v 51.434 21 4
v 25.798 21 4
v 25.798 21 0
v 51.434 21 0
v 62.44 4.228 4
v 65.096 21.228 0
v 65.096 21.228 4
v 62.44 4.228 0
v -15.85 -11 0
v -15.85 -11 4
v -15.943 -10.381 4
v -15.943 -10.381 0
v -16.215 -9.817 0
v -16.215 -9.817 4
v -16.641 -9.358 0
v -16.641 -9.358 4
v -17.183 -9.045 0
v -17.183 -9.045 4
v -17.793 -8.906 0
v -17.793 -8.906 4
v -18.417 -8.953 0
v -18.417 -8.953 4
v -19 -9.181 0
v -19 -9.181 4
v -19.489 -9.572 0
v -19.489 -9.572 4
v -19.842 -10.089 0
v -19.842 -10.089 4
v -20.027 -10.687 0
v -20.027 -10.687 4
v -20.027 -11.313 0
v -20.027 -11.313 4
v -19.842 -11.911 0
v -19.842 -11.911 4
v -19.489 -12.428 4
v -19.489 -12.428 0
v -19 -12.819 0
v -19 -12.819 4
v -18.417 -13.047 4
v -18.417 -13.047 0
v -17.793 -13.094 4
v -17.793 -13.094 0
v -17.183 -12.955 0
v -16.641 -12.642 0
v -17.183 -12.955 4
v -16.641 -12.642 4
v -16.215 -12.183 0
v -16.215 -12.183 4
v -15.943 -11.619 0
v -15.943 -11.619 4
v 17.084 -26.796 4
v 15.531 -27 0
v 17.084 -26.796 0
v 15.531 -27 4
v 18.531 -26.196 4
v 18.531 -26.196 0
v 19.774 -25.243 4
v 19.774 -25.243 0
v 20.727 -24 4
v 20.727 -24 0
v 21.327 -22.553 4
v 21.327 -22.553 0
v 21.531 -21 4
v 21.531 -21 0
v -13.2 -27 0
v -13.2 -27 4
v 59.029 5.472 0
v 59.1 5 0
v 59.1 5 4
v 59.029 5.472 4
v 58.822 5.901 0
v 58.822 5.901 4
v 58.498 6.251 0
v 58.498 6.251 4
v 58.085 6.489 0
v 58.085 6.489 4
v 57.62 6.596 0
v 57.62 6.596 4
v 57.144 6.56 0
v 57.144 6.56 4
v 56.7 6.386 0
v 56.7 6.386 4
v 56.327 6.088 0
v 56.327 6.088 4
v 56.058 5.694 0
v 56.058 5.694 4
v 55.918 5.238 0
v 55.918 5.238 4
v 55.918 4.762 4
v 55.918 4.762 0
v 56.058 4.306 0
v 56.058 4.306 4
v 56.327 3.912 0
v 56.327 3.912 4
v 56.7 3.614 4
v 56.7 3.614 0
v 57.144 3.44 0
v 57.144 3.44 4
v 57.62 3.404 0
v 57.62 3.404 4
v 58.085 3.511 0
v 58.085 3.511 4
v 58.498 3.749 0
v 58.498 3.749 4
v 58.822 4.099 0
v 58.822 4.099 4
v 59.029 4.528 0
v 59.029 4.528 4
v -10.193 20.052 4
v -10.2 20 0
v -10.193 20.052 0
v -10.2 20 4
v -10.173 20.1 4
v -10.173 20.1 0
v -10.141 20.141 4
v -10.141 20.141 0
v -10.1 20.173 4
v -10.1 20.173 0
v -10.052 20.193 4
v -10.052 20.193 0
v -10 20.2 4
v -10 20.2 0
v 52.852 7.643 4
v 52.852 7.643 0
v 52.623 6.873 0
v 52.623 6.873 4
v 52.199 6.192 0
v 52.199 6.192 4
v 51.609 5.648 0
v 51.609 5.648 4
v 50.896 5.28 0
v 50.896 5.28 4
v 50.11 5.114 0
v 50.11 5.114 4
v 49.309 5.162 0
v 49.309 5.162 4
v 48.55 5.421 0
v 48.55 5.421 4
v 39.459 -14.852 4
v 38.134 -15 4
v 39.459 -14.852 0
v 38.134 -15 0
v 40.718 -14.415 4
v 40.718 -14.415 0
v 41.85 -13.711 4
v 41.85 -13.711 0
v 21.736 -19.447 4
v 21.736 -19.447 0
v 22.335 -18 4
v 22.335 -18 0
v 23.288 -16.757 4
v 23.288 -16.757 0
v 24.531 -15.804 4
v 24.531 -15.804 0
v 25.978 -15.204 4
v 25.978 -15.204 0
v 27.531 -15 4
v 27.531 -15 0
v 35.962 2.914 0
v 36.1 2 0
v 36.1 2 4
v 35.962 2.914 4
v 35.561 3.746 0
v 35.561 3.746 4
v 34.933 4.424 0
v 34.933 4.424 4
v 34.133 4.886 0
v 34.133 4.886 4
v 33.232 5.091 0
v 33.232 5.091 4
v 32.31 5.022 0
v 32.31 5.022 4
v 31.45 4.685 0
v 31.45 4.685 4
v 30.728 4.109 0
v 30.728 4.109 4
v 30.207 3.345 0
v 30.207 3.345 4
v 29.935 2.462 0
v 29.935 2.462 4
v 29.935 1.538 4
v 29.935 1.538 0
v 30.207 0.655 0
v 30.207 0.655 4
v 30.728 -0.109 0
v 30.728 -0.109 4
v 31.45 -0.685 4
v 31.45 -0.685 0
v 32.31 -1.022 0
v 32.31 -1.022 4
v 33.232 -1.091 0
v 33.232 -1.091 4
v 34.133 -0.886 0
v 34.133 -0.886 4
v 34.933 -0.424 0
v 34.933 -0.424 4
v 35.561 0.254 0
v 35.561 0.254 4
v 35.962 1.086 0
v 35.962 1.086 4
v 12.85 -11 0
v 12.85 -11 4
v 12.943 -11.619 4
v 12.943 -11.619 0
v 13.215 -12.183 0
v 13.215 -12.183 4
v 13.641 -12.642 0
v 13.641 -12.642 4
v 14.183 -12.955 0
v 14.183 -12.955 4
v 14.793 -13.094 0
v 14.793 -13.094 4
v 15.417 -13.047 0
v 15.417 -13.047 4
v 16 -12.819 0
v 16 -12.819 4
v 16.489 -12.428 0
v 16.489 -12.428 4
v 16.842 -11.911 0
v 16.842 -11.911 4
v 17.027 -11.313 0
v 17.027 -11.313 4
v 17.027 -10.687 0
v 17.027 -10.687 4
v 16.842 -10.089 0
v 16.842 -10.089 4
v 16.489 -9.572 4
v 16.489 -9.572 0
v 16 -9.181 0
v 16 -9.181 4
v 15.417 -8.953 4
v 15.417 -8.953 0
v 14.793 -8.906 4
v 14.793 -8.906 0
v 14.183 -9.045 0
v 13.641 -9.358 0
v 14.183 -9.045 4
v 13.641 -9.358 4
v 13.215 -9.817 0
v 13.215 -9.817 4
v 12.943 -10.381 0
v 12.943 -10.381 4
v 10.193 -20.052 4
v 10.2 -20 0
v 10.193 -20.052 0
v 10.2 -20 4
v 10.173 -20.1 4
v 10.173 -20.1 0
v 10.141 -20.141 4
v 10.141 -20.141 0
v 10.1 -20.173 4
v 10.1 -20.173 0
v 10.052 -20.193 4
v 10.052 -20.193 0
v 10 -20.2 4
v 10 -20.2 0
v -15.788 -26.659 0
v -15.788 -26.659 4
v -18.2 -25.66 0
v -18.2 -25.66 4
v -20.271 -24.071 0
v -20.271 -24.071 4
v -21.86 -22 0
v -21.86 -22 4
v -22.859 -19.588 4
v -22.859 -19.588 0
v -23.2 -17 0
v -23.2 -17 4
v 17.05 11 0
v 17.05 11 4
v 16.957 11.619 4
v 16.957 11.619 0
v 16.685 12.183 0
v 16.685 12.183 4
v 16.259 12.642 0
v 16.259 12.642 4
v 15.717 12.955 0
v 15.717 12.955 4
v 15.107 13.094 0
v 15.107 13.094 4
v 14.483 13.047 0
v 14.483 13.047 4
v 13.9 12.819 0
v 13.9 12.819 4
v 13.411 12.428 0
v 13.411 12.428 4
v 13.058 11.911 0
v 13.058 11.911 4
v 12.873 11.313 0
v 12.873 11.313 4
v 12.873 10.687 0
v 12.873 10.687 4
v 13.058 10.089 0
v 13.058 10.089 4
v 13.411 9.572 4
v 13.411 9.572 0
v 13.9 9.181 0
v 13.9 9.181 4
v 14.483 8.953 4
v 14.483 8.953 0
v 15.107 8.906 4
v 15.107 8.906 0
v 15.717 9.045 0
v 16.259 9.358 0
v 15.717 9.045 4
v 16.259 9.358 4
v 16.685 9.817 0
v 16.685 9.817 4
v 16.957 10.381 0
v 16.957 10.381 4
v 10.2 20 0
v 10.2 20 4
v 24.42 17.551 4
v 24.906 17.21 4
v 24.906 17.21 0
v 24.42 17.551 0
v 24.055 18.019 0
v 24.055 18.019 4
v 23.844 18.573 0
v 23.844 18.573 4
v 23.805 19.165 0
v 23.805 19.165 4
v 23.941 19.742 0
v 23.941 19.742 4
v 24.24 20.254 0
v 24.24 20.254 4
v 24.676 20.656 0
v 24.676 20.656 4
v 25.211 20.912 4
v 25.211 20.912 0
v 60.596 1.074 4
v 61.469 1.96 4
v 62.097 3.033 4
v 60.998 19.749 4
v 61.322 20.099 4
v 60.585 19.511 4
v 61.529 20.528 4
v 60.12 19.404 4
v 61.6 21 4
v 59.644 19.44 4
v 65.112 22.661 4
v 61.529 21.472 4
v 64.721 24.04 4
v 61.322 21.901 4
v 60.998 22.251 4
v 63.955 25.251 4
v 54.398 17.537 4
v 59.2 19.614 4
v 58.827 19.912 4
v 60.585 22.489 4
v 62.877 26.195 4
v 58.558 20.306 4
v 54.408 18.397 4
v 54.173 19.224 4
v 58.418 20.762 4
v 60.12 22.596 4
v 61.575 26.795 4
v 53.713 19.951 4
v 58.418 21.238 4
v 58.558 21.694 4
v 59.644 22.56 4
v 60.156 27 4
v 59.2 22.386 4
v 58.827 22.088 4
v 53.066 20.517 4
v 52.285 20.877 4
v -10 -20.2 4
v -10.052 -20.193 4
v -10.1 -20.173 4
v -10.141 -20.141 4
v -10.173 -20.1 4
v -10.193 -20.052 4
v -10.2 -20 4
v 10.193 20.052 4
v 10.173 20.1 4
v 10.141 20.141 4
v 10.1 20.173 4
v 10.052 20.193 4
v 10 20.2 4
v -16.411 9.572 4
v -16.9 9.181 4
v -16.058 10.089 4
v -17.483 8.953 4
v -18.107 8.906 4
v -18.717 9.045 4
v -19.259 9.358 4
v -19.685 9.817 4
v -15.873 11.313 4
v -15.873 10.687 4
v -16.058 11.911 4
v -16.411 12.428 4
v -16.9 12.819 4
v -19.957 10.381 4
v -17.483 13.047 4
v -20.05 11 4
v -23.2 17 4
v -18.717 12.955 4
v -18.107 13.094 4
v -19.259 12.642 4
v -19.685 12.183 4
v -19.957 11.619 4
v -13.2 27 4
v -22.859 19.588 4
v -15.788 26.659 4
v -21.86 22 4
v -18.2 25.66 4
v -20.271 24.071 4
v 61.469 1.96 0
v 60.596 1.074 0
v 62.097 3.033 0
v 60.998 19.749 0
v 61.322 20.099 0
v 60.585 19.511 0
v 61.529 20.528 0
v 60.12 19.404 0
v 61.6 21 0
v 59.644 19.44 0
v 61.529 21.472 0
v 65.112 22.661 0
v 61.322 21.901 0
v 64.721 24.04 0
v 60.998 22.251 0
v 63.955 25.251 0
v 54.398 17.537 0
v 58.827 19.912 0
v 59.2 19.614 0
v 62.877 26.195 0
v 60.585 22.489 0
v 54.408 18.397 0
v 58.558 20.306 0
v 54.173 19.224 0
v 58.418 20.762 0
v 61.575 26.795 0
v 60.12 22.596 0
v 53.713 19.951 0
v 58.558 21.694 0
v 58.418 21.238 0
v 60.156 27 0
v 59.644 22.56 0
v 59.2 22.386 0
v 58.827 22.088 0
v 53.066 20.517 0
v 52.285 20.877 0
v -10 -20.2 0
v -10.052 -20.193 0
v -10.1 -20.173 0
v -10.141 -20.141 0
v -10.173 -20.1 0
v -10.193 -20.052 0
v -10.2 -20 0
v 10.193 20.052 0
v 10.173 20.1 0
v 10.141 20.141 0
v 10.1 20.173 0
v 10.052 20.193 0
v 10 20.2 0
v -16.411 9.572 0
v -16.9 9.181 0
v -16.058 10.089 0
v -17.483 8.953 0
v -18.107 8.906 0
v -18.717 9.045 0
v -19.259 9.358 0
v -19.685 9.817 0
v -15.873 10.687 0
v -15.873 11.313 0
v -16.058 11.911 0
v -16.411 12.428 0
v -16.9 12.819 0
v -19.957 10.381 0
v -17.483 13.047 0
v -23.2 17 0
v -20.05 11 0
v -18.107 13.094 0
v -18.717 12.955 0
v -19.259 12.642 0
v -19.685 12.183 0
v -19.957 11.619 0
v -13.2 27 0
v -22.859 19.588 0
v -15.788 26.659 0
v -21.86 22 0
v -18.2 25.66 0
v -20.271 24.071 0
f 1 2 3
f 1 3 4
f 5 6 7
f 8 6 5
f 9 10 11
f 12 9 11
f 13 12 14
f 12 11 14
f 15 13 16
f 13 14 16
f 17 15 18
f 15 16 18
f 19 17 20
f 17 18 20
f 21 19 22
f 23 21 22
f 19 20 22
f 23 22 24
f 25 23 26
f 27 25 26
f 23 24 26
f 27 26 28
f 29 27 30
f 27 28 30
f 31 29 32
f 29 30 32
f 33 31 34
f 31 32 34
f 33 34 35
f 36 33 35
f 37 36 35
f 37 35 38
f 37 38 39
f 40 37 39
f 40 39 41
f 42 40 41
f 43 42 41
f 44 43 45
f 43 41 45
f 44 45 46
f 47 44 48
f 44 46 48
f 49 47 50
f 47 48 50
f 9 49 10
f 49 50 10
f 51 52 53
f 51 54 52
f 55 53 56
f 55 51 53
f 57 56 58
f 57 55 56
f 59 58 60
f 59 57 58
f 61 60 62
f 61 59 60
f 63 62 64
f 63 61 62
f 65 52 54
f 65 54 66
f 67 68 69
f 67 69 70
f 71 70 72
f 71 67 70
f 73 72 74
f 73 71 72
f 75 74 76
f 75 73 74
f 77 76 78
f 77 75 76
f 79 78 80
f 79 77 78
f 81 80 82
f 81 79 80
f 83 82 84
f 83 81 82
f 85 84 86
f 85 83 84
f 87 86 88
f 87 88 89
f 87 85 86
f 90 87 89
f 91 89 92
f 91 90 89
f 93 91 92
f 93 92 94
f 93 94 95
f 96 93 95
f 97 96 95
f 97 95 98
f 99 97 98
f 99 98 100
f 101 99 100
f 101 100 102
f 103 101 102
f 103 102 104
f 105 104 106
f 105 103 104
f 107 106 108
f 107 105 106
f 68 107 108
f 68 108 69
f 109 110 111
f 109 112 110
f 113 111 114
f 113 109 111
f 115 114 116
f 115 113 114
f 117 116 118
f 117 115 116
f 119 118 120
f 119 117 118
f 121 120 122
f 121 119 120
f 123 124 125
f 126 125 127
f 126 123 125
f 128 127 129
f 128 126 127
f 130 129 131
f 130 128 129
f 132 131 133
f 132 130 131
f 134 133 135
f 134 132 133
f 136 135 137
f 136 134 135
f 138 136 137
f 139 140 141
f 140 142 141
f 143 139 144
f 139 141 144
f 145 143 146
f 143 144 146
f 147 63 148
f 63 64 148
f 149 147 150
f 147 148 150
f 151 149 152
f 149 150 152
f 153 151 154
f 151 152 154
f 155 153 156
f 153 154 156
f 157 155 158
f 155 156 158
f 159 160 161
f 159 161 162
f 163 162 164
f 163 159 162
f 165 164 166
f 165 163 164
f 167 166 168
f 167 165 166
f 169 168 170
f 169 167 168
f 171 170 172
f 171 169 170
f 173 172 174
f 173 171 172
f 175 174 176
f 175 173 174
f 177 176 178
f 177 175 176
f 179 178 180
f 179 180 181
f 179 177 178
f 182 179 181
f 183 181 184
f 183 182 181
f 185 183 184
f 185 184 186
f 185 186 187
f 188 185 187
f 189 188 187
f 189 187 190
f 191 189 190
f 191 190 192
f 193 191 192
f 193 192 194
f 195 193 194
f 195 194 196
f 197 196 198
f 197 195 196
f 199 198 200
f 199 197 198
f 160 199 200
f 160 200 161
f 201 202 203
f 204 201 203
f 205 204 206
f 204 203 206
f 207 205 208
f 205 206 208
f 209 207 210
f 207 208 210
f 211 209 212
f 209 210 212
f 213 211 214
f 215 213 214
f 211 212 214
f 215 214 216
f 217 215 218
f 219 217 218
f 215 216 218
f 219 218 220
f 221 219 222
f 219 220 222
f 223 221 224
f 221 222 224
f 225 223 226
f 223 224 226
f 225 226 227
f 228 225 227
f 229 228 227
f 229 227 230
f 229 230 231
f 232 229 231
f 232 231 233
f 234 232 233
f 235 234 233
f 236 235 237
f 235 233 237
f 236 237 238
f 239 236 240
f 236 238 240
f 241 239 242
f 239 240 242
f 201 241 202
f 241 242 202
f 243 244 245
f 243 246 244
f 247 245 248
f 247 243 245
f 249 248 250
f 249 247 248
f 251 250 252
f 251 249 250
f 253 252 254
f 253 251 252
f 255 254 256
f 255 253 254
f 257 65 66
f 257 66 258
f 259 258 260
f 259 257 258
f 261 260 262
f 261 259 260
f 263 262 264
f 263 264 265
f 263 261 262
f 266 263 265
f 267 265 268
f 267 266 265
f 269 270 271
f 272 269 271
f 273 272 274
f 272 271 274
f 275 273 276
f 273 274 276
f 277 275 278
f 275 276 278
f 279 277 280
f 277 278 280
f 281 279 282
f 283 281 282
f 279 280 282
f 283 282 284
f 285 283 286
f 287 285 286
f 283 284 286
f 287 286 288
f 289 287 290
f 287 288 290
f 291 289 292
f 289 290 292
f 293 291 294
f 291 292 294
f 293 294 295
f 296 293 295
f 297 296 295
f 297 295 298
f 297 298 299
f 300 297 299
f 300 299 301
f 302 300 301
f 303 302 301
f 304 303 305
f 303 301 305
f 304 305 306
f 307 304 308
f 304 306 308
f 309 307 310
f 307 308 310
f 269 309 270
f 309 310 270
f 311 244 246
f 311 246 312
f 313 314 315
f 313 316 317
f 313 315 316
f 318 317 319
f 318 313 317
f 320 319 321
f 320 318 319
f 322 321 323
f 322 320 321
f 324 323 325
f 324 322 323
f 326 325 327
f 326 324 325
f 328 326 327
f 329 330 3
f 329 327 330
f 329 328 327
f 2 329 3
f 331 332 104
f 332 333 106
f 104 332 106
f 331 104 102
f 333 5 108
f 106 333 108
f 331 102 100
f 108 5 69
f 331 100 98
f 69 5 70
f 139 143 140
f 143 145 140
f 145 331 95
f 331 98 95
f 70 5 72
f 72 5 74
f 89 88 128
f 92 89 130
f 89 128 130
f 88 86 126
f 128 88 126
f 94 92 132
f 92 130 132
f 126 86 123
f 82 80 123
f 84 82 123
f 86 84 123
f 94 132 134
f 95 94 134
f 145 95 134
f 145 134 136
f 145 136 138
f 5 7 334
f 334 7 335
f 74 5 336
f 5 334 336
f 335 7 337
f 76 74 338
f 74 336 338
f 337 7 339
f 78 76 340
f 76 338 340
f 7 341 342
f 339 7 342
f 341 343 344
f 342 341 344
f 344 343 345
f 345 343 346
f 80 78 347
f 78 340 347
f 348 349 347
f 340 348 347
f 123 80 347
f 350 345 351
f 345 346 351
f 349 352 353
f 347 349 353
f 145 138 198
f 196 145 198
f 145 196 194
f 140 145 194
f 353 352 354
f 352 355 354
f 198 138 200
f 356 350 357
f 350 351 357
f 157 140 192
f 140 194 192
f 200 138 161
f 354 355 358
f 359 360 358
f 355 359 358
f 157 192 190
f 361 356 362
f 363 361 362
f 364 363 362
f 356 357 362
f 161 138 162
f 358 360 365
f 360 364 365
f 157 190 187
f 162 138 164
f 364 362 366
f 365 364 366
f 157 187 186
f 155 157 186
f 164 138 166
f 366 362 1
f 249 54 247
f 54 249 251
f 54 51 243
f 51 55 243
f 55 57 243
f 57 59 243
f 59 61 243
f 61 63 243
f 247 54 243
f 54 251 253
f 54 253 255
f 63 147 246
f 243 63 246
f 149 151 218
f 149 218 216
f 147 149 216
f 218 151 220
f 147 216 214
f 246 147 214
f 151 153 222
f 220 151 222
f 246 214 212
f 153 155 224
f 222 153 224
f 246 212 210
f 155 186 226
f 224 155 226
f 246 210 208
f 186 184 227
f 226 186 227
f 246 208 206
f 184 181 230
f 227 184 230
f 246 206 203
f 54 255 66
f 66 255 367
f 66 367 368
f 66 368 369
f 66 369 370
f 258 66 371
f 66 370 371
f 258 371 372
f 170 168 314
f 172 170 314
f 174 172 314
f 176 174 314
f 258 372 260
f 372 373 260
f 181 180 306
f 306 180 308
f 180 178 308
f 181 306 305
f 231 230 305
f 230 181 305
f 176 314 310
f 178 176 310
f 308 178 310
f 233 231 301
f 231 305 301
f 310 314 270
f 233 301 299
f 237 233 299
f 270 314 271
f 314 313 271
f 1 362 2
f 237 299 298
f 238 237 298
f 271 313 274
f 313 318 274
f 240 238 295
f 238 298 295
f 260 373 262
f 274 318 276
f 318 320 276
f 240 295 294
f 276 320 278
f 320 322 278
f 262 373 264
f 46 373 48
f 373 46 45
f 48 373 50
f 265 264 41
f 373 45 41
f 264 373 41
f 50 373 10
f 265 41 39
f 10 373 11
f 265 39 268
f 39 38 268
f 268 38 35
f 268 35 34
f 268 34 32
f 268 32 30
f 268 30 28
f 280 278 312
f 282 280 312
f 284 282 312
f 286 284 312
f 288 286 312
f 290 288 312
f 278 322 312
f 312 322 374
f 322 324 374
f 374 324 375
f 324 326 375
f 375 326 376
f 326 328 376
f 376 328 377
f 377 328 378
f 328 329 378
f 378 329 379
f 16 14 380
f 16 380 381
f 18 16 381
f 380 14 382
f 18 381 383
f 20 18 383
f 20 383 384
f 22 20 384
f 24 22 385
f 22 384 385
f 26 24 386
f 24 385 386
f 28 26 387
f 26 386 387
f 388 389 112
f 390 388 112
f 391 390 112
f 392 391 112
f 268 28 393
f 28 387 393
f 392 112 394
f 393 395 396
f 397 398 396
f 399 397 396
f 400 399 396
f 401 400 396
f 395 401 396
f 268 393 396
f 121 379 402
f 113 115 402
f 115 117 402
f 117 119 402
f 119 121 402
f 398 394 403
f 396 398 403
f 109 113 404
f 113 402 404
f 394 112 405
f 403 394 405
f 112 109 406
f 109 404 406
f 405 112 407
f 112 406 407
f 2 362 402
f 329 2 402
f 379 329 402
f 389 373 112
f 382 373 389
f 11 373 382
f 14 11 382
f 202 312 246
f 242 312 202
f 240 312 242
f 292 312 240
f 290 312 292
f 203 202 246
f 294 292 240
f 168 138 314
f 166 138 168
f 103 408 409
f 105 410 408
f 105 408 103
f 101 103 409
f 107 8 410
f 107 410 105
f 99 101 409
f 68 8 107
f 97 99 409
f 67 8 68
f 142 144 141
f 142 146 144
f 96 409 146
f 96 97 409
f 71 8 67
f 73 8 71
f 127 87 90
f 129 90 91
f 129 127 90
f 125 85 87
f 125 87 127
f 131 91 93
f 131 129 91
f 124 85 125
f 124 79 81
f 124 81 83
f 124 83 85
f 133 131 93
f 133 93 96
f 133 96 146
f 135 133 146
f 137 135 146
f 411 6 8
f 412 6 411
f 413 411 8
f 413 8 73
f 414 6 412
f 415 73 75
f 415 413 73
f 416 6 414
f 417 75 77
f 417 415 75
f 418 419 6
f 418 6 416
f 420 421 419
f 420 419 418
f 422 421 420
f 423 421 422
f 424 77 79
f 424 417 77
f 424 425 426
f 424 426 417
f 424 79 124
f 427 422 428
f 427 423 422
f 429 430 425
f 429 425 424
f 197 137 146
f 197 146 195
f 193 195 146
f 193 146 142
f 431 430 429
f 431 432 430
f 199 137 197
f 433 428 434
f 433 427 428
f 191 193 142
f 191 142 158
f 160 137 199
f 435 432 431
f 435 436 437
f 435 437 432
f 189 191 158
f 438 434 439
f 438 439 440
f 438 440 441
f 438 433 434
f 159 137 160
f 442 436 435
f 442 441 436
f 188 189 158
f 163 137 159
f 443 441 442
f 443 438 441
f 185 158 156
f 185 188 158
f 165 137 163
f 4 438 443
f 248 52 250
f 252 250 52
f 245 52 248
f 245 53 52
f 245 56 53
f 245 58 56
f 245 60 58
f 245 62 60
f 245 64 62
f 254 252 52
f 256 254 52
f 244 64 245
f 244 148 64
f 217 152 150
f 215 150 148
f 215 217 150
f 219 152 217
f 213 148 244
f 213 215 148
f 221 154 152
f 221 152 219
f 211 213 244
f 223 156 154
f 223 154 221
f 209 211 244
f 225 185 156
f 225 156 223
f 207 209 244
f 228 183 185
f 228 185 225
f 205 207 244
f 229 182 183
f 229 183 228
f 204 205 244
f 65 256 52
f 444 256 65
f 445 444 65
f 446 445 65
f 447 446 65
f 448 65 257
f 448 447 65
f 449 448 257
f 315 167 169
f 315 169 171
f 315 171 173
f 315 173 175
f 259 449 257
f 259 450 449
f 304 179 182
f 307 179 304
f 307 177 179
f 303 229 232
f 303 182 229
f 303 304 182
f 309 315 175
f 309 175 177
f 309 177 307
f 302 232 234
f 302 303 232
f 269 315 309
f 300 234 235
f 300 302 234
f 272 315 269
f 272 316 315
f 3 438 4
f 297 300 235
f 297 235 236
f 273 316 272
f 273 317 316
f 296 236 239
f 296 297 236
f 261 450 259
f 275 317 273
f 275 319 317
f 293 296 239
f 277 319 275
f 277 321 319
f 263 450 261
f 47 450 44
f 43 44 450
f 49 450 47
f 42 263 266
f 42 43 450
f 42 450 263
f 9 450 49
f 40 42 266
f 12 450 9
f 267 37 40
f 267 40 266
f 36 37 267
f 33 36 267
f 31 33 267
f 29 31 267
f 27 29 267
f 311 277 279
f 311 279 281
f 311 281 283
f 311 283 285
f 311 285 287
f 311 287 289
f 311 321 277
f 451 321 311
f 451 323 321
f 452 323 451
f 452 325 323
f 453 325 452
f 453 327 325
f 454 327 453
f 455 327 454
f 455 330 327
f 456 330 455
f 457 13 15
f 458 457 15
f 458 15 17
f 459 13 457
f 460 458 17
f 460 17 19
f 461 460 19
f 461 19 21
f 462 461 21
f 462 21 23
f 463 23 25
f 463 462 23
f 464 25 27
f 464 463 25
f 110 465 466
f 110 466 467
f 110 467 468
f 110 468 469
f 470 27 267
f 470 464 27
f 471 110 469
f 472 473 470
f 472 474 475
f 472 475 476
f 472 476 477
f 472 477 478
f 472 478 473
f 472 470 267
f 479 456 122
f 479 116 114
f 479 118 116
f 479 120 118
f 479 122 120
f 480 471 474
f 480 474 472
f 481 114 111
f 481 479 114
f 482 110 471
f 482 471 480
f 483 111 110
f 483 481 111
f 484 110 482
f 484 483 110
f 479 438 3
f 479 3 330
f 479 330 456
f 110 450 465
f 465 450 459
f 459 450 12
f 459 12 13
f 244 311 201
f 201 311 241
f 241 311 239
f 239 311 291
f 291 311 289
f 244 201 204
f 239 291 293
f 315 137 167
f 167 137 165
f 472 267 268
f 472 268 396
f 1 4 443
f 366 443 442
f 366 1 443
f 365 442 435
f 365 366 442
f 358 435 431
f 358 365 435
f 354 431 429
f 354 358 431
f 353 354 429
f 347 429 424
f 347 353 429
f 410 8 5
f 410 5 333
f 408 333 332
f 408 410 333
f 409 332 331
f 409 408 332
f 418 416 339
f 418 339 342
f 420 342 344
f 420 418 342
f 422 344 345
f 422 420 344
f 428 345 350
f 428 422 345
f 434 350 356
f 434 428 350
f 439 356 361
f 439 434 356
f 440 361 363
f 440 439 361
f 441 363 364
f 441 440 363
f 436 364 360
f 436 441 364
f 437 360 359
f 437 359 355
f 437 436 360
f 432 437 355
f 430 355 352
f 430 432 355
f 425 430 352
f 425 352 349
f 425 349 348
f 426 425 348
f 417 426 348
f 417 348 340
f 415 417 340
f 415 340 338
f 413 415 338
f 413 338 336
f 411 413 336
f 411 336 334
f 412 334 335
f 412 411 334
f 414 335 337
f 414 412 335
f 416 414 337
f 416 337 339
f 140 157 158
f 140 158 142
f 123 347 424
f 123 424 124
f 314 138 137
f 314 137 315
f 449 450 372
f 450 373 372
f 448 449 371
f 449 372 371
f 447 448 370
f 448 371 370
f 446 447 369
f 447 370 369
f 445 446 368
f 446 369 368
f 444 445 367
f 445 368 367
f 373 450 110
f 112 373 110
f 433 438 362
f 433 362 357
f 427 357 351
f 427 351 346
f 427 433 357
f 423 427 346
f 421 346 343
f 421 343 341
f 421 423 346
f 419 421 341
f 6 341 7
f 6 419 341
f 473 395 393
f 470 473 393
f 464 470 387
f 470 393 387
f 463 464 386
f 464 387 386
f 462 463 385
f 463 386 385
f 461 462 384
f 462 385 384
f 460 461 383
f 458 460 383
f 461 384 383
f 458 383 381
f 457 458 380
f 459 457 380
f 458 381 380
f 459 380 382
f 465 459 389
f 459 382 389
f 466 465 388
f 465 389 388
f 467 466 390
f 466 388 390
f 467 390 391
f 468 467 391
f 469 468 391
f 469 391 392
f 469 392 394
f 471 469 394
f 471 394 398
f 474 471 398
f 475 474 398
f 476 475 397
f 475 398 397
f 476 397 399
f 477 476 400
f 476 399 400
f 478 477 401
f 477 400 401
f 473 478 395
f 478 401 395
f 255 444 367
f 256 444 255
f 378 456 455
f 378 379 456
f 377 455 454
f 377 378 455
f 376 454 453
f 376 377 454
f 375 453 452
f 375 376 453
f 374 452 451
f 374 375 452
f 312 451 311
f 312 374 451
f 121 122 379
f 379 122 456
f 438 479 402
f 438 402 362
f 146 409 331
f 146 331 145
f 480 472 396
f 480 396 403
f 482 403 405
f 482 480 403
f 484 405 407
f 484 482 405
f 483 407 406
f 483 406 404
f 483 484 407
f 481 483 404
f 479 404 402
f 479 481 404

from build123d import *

# Parameters (mm, degrees)
SKETCH_1_R          = 3.1
SKETCH_1_R_2        = 1.6
SKETCH_1_W          = 20.4
SKETCH_1_H          = 40.4
EXTRUDE_1_DEPTH     = 4
FILLET_1_R          = 0.2
SKETCH_2_R          = 2.1
CUT_EXTRUDE_1_DEPTH = 4
CUT_EXTRUDE_2_DEPTH = 10
SKETCH_4_W          = 44.796452611
SKETCH_4_H          = 12
CUT_EXTRUDE_3_DEPTH = 10
FILLET_2_R          = 6


with BuildPart() as part:
    # 草图1 → 凸台-拉伸1 (new body)
    with BuildSketch(Plane.XY):
        with BuildLine():
            Line((-13.2, 27), (60.15625, 27))
            ThreePointArc((60.15625, 27), (63.954895943, 25.251198086), (65.096310169, 21.228115599))
            Line((65.096310169, 21.228115599), (62.440060169, 4.228115599))
            ThreePointArc((62.440060169, 4.228115599), (61.816569536, 2.476663431), (60.596300169, 1.074070141))
            Line((60.596300169, 1.074070141), (27.72371786, -24.851859719))
            ThreePointArc((27.72371786, -24.851859719), (24.808418455, -26.447713935), (21.531117522, -27))
            Line((21.531117522, -27), (-13.2, -27))
            ThreePointArc((-13.2, -27), (-20.271067812, -24.071067812), (-23.2, -17))
            Line((-23.2, -17), (-23.2, 17))
            ThreePointArc((-23.2, 17), (-20.271067812, 24.071067812), (-13.2, 27))
        make_face()
        with Locations((33, 2)):
            Circle(SKETCH_1_R, mode=Mode.SUBTRACT)
        with Locations((60, 21)):
            Circle(SKETCH_1_R_2, mode=Mode.SUBTRACT)
        with Locations((57.5, 5)):
            Circle(SKETCH_1_R_2, mode=Mode.SUBTRACT)
        Rectangle(SKETCH_1_W, SKETCH_1_H, mode=Mode.SUBTRACT)
    extrude(amount=EXTRUDE_1_DEPTH)

    # 圆角1
    fillet_1_edges = [part.edges().sort_by_distance(p)[0] for p in [
        (-10.2, 20.2, 2),
        (-10.2, -20.2, 2),
        (10.2, -20.2, 2),
        (10.2, 20.2, 2),
    ]]
    fillet(fillet_1_edges, radius=FILLET_1_R)

    # 草图2 → 切除-拉伸1 (cut)
    with BuildSketch(Plane.XY.offset(4)):
        with Locations((14.95, 11)):
            Circle(SKETCH_2_R)
        with Locations(Location((14.95, -11, 0), (0, 0, 180))):
            Circle(SKETCH_2_R)
        with Locations((-17.95, -11)):
            Circle(SKETCH_2_R)
        with Locations(Location((-17.95, 11, 0), (0, 0, 180))):
            Circle(SKETCH_2_R)
    extrude(amount=-CUT_EXTRUDE_1_DEPTH, mode=Mode.SUBTRACT)

    # 草图3 → 切除-拉伸2 (cut)
    with BuildSketch(Plane.XY.offset(4)):
        with BuildLine():
            Line((25.798016292, 21), (51.43418263, 21))
            ThreePointArc((51.43418263, 21), (53.713370196, 19.950718852), (54.398218731, 17.536869359))
            Line((54.398218731, 17.536869359), (52.852232934, 7.642560256))
            ThreePointArc((52.852232934, 7.642560256), (51.264559821, 5.440053089), (48.549531682, 5.420923567))
            Line((48.549531682, 5.420923567), (24.905572858, 17.210155114))
            ThreePointArc((24.905572858, 17.210155114), (23.851263897, 19.458426781), (25.798016292, 21))
        make_face()
    extrude(amount=-CUT_EXTRUDE_2_DEPTH, mode=Mode.SUBTRACT)

    # 草图4 → 切除-拉伸3 (cut)
    with BuildSketch(Plane.XY.offset(4)):
        with Locations((43.929343828, -21)):
            Rectangle(SKETCH_4_W, SKETCH_4_H)
    extrude(amount=-CUT_EXTRUDE_3_DEPTH, mode=Mode.SUBTRACT)

    # 圆角2
    fillet_2_edges = [part.edges().sort_by_distance(p)[0] for p in [
        (40.215307217, -15, 2),
        (21.531117522, -27, 2),
        (21.531117522, -15, 2),
    ]]
    fillet(fillet_2_edges, radius=FILLET_2_R - 0.0001)  # a hair under: the kernel refuses the full size


solid = part.part
